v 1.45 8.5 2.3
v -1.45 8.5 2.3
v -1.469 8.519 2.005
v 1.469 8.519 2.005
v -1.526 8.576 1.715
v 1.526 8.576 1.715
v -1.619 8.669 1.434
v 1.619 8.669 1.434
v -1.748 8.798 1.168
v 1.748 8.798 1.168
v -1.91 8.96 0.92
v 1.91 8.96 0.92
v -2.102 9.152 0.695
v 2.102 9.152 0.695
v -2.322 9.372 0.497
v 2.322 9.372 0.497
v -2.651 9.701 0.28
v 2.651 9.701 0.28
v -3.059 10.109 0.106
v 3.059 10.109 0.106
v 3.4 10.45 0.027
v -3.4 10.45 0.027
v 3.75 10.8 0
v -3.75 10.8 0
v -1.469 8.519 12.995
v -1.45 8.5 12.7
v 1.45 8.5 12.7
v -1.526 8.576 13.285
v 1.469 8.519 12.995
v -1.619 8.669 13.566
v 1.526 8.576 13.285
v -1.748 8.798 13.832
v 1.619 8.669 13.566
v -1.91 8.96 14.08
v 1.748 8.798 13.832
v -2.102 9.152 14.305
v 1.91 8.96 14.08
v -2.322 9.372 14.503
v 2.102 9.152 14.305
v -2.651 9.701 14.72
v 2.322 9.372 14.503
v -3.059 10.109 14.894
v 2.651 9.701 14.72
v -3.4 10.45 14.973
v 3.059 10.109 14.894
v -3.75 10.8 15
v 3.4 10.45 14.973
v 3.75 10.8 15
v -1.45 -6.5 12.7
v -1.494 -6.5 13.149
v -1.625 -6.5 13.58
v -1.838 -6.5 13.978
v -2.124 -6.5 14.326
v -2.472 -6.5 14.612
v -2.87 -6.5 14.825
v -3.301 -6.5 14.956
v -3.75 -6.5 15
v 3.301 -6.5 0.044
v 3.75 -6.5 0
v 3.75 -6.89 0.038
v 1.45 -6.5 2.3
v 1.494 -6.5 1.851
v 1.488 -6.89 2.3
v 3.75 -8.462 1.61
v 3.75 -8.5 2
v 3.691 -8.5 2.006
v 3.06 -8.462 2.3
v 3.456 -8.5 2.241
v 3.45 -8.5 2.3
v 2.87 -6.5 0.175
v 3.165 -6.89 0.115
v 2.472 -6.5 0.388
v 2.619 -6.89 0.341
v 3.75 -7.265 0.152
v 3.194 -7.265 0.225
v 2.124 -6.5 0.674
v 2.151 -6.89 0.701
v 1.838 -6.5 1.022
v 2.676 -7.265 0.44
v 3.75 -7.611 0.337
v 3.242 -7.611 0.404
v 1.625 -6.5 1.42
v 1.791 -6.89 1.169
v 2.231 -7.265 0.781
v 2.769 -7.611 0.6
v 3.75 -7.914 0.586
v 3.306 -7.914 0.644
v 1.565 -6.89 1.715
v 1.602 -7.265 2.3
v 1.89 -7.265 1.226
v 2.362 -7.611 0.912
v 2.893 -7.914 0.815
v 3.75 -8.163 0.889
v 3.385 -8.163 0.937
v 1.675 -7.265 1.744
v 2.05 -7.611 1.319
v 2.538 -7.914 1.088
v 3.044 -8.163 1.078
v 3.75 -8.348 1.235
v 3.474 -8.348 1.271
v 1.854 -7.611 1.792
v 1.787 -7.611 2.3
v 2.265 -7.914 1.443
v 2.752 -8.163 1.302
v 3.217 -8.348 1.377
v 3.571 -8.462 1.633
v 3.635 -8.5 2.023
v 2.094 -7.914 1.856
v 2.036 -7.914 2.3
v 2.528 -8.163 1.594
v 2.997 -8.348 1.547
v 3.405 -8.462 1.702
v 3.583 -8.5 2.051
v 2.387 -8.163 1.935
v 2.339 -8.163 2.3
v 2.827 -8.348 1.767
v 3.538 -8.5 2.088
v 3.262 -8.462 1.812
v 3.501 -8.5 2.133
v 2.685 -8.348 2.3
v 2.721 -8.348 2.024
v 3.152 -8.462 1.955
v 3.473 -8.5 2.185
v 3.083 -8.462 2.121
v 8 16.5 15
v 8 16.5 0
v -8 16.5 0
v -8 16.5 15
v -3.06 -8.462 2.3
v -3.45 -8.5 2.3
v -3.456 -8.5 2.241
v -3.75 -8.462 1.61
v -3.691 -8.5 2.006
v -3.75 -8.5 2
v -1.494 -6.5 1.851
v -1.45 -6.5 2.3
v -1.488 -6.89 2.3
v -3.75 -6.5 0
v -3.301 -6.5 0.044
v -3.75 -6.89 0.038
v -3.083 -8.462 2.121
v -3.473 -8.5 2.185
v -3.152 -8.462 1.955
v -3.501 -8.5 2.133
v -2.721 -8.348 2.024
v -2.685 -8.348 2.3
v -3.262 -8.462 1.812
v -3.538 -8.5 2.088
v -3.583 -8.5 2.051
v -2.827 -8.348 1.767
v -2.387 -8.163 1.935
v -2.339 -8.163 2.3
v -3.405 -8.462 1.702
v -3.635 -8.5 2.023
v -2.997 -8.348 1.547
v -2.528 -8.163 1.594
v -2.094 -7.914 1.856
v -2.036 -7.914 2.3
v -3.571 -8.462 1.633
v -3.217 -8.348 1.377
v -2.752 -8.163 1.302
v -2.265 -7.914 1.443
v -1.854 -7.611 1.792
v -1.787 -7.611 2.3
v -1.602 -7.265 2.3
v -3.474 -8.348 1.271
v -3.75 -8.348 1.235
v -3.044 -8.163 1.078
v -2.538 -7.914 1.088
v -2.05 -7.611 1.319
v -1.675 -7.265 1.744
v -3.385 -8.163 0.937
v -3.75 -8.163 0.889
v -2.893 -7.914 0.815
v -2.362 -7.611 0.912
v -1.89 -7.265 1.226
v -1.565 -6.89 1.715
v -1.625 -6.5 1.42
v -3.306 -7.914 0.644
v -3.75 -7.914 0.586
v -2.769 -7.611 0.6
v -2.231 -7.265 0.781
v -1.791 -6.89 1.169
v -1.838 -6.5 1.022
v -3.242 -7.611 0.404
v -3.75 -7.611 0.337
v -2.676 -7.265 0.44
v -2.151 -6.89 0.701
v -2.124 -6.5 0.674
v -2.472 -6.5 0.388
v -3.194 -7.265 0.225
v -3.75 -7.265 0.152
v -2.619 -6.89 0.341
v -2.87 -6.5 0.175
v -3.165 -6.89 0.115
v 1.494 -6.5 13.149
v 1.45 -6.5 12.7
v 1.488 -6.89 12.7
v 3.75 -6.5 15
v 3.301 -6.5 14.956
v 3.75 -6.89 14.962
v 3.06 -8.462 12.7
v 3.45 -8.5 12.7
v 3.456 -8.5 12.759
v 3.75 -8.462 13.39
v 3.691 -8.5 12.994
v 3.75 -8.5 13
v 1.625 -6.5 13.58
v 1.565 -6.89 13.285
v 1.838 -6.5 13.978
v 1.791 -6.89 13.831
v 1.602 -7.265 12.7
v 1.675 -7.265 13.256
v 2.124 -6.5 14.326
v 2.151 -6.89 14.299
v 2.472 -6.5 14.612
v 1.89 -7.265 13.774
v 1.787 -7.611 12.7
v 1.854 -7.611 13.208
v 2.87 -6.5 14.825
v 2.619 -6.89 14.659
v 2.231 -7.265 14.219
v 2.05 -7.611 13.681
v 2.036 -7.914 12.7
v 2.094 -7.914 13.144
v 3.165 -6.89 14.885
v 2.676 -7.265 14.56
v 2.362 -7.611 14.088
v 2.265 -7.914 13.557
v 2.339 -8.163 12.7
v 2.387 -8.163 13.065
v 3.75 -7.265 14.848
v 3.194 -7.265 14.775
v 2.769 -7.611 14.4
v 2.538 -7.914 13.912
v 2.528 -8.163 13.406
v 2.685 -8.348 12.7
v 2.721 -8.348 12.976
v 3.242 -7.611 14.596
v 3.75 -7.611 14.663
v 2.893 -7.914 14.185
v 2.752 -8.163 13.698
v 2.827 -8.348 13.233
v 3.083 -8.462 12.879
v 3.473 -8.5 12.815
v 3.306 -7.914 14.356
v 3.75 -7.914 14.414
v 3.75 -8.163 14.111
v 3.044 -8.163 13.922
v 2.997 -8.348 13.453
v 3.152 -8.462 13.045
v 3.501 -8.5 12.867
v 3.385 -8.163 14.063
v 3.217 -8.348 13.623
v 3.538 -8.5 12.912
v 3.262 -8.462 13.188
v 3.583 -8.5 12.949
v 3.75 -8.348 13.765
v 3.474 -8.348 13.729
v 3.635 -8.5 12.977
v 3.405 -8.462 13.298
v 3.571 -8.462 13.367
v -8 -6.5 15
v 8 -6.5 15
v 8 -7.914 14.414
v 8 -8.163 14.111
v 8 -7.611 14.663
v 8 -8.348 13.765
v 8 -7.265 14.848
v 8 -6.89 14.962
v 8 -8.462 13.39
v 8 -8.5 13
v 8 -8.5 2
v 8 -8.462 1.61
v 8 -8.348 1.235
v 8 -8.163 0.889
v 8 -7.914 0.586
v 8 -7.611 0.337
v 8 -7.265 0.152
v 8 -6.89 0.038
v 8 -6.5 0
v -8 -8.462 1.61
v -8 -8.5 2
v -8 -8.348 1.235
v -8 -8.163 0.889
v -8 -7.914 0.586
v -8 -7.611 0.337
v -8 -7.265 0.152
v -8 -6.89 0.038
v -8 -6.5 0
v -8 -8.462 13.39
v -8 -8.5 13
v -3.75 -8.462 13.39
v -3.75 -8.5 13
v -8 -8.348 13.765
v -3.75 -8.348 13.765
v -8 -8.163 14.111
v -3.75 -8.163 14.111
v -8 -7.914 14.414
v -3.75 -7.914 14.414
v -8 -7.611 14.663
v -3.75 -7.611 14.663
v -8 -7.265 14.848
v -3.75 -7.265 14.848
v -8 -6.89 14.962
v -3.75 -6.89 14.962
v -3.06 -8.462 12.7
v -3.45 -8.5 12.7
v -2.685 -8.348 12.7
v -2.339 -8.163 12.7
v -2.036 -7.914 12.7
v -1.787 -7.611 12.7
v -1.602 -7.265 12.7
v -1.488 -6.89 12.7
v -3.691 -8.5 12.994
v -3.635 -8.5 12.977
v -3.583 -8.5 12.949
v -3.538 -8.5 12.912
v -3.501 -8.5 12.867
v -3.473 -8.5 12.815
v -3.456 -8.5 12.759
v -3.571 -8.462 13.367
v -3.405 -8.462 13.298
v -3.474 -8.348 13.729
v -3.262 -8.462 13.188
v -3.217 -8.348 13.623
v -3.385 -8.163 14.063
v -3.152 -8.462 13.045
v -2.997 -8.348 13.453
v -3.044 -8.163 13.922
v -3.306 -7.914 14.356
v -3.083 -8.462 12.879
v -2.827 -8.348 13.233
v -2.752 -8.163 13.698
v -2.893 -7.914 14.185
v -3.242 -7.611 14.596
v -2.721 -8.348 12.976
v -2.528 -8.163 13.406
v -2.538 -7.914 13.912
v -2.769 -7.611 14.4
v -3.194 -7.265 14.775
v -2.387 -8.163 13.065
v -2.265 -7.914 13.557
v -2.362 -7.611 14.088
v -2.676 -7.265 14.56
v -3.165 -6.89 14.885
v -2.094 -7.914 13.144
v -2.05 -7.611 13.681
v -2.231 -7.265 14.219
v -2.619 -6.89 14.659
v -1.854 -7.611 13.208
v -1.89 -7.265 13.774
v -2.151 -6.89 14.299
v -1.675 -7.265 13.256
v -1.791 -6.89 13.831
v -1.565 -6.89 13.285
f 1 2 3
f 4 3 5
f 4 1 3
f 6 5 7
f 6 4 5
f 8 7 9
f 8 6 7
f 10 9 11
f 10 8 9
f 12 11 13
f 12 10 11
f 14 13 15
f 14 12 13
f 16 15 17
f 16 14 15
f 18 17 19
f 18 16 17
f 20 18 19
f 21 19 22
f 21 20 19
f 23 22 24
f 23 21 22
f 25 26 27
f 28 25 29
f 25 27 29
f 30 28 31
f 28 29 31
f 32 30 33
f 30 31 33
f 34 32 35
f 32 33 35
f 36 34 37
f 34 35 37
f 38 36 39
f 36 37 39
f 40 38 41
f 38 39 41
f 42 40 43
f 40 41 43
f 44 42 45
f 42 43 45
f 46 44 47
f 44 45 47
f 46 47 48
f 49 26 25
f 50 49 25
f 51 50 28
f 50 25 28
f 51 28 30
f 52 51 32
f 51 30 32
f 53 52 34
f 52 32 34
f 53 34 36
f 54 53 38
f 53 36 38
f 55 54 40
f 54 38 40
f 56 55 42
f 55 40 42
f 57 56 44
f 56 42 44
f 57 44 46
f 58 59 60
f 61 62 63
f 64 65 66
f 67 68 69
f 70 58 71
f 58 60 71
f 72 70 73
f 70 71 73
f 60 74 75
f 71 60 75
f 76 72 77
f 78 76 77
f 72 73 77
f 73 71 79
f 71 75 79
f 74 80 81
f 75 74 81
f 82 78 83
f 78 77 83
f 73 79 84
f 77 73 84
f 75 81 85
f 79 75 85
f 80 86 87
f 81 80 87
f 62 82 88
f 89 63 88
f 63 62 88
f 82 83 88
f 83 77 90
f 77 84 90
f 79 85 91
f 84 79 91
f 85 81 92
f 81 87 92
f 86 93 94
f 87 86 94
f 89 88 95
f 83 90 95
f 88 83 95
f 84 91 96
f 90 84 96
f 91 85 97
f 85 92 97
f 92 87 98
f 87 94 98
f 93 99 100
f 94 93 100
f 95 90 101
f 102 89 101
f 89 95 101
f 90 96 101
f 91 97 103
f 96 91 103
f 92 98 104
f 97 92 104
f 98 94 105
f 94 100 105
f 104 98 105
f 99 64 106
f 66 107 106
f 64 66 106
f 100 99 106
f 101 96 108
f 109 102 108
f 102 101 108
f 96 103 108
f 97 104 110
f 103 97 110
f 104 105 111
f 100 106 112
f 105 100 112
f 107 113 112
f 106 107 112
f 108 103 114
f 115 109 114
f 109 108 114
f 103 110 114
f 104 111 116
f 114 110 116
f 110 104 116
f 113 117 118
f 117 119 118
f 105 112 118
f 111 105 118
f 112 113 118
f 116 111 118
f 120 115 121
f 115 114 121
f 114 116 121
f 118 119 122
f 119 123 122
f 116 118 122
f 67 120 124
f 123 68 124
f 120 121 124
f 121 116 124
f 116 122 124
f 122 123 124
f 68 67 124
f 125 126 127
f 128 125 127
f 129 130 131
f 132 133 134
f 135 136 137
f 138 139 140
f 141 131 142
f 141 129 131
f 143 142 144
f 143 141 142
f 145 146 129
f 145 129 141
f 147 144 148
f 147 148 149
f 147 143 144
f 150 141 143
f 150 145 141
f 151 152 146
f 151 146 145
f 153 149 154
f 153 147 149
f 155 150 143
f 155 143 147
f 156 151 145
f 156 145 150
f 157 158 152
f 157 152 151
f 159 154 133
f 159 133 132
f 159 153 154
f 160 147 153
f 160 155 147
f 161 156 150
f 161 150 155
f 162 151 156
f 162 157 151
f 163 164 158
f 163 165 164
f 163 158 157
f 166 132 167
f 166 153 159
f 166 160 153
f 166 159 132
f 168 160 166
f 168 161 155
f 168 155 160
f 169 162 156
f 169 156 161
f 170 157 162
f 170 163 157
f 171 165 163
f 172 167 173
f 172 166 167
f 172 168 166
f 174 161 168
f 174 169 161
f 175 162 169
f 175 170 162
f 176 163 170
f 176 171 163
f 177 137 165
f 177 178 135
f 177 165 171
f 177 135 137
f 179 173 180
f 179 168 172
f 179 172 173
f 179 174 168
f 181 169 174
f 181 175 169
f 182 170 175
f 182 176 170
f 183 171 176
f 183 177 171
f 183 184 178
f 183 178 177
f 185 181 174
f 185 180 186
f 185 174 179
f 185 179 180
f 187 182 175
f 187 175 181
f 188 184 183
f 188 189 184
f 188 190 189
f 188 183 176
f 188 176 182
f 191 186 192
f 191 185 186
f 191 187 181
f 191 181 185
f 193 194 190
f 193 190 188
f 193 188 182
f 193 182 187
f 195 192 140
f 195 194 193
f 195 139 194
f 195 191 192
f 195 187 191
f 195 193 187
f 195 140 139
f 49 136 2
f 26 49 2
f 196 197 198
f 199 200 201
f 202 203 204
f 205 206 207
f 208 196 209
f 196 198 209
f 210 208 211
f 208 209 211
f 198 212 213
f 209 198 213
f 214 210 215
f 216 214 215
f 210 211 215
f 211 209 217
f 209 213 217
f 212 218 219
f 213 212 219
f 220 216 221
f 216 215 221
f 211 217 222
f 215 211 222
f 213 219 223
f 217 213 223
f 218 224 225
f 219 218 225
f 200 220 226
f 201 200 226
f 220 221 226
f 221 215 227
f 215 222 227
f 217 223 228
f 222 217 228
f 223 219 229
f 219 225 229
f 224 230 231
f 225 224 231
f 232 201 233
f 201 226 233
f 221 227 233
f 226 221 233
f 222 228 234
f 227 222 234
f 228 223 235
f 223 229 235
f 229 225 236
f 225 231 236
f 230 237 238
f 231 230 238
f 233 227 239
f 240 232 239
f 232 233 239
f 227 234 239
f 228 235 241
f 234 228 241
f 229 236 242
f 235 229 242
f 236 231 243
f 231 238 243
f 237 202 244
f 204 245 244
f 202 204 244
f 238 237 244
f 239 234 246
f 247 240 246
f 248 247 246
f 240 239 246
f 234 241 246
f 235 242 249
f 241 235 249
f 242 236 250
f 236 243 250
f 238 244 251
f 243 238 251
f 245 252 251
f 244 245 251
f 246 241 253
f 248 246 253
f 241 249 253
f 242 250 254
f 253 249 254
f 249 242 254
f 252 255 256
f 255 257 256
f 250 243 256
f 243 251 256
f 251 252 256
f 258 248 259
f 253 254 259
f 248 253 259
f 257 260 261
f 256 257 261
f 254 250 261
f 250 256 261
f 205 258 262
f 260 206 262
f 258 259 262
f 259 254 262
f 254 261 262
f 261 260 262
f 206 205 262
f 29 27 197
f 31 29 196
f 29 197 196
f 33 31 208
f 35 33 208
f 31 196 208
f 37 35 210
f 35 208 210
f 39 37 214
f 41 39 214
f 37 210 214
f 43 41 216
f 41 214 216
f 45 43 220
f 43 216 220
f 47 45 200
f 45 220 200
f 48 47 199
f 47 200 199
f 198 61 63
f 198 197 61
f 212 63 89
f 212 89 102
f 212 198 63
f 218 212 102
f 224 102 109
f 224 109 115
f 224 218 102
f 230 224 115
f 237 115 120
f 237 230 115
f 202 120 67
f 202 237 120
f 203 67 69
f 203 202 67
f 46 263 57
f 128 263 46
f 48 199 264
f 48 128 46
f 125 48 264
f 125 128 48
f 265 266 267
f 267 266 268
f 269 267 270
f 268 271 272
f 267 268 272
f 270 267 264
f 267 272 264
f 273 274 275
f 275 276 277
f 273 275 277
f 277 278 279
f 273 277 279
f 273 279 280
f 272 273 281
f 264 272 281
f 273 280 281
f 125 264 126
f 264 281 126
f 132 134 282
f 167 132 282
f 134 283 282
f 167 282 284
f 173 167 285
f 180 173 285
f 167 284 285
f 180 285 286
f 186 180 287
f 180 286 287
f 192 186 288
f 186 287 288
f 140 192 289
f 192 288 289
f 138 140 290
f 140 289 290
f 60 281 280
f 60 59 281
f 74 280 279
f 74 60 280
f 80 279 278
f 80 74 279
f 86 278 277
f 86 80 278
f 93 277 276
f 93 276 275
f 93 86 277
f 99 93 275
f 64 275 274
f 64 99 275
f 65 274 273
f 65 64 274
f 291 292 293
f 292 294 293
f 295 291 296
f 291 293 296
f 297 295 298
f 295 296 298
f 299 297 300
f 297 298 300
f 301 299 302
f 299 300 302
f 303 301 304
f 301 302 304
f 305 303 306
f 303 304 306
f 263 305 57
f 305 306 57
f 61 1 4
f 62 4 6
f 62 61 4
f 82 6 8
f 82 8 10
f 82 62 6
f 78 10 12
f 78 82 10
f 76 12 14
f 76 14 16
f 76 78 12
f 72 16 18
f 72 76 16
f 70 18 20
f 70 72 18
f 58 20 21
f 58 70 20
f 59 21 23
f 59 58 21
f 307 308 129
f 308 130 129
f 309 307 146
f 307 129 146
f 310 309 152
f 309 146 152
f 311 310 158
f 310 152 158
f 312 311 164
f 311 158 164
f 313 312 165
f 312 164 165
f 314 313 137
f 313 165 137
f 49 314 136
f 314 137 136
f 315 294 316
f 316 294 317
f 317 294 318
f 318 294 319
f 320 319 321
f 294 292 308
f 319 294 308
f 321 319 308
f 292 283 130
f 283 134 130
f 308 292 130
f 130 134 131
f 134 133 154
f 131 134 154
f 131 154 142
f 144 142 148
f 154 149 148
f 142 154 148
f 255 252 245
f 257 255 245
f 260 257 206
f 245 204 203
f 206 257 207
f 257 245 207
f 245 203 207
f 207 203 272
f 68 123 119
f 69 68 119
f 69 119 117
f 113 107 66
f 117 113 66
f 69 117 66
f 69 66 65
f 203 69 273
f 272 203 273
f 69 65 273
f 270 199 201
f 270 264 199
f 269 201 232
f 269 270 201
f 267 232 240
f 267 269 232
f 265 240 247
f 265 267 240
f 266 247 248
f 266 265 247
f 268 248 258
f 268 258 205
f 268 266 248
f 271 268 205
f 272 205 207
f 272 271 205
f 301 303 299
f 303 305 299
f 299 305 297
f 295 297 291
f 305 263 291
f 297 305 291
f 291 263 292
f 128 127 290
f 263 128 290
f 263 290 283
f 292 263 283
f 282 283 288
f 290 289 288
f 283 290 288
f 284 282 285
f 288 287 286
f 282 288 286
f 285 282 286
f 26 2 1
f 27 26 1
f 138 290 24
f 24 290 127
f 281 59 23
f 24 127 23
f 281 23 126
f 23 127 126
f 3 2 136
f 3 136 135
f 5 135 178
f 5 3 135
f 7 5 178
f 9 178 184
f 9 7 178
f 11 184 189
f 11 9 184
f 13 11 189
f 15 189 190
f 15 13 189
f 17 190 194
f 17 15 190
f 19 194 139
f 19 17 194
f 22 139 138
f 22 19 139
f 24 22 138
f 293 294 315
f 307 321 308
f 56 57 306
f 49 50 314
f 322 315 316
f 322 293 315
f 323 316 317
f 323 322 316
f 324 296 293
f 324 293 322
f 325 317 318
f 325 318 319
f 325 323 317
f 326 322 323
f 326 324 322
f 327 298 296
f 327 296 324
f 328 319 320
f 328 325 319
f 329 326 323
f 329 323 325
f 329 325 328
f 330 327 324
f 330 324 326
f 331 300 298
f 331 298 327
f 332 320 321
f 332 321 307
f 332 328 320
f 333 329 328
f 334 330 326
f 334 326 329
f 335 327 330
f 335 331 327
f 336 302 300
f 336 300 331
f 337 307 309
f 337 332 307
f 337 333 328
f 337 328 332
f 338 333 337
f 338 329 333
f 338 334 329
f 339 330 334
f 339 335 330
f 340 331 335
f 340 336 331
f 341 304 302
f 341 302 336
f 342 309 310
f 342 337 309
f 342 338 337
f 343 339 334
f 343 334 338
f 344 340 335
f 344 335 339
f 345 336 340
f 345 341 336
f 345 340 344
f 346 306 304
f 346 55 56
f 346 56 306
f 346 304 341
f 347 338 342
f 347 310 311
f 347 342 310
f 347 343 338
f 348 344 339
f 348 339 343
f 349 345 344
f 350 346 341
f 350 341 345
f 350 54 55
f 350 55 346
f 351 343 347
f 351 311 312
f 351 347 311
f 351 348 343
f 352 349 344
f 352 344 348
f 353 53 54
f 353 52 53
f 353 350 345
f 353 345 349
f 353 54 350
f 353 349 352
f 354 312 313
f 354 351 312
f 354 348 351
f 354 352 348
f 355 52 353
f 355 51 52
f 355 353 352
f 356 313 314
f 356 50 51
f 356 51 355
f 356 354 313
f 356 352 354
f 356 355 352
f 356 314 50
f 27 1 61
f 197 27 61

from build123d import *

# Parameters (mm, degrees)
F1_DEPTH = 15
F2_R     = 2.3
F3_R     = 2


with BuildPart() as f1:
    # F0 (on Top) → F1 (new body)
    with BuildSketch(Plane.XY):
        Polygon((-1.45, 8.5), (1.45, 8.5), (1.45, -8.5), (8, -8.5), (8, 16.5), (0, 16.5), (-8, 16.5), (-8, -8.5), (-1.45, -8.5), align=None)
    extrude(amount=F1_DEPTH)

    # F2
    f2_edges = [f1.edges().sort_by_distance(p)[0] for p in [
        (-1.45, 0, 15),
        (0, 8.5, 15),
        (1.45, 0, 15),
        (1.45, 0, 0),
        (0, 8.5, 0),
        (-1.45, 0, 0),
    ]]
    fillet(f2_edges, radius=F2_R)

    # F3
    f3_edges = [f1.edges().sort_by_distance(p)[0] for p in [
        (-5.875, -8.5, 15),
        (5.875, -8.5, 15),
    ]]
    fillet(f3_edges, radius=F3_R)


solid = f1.part
